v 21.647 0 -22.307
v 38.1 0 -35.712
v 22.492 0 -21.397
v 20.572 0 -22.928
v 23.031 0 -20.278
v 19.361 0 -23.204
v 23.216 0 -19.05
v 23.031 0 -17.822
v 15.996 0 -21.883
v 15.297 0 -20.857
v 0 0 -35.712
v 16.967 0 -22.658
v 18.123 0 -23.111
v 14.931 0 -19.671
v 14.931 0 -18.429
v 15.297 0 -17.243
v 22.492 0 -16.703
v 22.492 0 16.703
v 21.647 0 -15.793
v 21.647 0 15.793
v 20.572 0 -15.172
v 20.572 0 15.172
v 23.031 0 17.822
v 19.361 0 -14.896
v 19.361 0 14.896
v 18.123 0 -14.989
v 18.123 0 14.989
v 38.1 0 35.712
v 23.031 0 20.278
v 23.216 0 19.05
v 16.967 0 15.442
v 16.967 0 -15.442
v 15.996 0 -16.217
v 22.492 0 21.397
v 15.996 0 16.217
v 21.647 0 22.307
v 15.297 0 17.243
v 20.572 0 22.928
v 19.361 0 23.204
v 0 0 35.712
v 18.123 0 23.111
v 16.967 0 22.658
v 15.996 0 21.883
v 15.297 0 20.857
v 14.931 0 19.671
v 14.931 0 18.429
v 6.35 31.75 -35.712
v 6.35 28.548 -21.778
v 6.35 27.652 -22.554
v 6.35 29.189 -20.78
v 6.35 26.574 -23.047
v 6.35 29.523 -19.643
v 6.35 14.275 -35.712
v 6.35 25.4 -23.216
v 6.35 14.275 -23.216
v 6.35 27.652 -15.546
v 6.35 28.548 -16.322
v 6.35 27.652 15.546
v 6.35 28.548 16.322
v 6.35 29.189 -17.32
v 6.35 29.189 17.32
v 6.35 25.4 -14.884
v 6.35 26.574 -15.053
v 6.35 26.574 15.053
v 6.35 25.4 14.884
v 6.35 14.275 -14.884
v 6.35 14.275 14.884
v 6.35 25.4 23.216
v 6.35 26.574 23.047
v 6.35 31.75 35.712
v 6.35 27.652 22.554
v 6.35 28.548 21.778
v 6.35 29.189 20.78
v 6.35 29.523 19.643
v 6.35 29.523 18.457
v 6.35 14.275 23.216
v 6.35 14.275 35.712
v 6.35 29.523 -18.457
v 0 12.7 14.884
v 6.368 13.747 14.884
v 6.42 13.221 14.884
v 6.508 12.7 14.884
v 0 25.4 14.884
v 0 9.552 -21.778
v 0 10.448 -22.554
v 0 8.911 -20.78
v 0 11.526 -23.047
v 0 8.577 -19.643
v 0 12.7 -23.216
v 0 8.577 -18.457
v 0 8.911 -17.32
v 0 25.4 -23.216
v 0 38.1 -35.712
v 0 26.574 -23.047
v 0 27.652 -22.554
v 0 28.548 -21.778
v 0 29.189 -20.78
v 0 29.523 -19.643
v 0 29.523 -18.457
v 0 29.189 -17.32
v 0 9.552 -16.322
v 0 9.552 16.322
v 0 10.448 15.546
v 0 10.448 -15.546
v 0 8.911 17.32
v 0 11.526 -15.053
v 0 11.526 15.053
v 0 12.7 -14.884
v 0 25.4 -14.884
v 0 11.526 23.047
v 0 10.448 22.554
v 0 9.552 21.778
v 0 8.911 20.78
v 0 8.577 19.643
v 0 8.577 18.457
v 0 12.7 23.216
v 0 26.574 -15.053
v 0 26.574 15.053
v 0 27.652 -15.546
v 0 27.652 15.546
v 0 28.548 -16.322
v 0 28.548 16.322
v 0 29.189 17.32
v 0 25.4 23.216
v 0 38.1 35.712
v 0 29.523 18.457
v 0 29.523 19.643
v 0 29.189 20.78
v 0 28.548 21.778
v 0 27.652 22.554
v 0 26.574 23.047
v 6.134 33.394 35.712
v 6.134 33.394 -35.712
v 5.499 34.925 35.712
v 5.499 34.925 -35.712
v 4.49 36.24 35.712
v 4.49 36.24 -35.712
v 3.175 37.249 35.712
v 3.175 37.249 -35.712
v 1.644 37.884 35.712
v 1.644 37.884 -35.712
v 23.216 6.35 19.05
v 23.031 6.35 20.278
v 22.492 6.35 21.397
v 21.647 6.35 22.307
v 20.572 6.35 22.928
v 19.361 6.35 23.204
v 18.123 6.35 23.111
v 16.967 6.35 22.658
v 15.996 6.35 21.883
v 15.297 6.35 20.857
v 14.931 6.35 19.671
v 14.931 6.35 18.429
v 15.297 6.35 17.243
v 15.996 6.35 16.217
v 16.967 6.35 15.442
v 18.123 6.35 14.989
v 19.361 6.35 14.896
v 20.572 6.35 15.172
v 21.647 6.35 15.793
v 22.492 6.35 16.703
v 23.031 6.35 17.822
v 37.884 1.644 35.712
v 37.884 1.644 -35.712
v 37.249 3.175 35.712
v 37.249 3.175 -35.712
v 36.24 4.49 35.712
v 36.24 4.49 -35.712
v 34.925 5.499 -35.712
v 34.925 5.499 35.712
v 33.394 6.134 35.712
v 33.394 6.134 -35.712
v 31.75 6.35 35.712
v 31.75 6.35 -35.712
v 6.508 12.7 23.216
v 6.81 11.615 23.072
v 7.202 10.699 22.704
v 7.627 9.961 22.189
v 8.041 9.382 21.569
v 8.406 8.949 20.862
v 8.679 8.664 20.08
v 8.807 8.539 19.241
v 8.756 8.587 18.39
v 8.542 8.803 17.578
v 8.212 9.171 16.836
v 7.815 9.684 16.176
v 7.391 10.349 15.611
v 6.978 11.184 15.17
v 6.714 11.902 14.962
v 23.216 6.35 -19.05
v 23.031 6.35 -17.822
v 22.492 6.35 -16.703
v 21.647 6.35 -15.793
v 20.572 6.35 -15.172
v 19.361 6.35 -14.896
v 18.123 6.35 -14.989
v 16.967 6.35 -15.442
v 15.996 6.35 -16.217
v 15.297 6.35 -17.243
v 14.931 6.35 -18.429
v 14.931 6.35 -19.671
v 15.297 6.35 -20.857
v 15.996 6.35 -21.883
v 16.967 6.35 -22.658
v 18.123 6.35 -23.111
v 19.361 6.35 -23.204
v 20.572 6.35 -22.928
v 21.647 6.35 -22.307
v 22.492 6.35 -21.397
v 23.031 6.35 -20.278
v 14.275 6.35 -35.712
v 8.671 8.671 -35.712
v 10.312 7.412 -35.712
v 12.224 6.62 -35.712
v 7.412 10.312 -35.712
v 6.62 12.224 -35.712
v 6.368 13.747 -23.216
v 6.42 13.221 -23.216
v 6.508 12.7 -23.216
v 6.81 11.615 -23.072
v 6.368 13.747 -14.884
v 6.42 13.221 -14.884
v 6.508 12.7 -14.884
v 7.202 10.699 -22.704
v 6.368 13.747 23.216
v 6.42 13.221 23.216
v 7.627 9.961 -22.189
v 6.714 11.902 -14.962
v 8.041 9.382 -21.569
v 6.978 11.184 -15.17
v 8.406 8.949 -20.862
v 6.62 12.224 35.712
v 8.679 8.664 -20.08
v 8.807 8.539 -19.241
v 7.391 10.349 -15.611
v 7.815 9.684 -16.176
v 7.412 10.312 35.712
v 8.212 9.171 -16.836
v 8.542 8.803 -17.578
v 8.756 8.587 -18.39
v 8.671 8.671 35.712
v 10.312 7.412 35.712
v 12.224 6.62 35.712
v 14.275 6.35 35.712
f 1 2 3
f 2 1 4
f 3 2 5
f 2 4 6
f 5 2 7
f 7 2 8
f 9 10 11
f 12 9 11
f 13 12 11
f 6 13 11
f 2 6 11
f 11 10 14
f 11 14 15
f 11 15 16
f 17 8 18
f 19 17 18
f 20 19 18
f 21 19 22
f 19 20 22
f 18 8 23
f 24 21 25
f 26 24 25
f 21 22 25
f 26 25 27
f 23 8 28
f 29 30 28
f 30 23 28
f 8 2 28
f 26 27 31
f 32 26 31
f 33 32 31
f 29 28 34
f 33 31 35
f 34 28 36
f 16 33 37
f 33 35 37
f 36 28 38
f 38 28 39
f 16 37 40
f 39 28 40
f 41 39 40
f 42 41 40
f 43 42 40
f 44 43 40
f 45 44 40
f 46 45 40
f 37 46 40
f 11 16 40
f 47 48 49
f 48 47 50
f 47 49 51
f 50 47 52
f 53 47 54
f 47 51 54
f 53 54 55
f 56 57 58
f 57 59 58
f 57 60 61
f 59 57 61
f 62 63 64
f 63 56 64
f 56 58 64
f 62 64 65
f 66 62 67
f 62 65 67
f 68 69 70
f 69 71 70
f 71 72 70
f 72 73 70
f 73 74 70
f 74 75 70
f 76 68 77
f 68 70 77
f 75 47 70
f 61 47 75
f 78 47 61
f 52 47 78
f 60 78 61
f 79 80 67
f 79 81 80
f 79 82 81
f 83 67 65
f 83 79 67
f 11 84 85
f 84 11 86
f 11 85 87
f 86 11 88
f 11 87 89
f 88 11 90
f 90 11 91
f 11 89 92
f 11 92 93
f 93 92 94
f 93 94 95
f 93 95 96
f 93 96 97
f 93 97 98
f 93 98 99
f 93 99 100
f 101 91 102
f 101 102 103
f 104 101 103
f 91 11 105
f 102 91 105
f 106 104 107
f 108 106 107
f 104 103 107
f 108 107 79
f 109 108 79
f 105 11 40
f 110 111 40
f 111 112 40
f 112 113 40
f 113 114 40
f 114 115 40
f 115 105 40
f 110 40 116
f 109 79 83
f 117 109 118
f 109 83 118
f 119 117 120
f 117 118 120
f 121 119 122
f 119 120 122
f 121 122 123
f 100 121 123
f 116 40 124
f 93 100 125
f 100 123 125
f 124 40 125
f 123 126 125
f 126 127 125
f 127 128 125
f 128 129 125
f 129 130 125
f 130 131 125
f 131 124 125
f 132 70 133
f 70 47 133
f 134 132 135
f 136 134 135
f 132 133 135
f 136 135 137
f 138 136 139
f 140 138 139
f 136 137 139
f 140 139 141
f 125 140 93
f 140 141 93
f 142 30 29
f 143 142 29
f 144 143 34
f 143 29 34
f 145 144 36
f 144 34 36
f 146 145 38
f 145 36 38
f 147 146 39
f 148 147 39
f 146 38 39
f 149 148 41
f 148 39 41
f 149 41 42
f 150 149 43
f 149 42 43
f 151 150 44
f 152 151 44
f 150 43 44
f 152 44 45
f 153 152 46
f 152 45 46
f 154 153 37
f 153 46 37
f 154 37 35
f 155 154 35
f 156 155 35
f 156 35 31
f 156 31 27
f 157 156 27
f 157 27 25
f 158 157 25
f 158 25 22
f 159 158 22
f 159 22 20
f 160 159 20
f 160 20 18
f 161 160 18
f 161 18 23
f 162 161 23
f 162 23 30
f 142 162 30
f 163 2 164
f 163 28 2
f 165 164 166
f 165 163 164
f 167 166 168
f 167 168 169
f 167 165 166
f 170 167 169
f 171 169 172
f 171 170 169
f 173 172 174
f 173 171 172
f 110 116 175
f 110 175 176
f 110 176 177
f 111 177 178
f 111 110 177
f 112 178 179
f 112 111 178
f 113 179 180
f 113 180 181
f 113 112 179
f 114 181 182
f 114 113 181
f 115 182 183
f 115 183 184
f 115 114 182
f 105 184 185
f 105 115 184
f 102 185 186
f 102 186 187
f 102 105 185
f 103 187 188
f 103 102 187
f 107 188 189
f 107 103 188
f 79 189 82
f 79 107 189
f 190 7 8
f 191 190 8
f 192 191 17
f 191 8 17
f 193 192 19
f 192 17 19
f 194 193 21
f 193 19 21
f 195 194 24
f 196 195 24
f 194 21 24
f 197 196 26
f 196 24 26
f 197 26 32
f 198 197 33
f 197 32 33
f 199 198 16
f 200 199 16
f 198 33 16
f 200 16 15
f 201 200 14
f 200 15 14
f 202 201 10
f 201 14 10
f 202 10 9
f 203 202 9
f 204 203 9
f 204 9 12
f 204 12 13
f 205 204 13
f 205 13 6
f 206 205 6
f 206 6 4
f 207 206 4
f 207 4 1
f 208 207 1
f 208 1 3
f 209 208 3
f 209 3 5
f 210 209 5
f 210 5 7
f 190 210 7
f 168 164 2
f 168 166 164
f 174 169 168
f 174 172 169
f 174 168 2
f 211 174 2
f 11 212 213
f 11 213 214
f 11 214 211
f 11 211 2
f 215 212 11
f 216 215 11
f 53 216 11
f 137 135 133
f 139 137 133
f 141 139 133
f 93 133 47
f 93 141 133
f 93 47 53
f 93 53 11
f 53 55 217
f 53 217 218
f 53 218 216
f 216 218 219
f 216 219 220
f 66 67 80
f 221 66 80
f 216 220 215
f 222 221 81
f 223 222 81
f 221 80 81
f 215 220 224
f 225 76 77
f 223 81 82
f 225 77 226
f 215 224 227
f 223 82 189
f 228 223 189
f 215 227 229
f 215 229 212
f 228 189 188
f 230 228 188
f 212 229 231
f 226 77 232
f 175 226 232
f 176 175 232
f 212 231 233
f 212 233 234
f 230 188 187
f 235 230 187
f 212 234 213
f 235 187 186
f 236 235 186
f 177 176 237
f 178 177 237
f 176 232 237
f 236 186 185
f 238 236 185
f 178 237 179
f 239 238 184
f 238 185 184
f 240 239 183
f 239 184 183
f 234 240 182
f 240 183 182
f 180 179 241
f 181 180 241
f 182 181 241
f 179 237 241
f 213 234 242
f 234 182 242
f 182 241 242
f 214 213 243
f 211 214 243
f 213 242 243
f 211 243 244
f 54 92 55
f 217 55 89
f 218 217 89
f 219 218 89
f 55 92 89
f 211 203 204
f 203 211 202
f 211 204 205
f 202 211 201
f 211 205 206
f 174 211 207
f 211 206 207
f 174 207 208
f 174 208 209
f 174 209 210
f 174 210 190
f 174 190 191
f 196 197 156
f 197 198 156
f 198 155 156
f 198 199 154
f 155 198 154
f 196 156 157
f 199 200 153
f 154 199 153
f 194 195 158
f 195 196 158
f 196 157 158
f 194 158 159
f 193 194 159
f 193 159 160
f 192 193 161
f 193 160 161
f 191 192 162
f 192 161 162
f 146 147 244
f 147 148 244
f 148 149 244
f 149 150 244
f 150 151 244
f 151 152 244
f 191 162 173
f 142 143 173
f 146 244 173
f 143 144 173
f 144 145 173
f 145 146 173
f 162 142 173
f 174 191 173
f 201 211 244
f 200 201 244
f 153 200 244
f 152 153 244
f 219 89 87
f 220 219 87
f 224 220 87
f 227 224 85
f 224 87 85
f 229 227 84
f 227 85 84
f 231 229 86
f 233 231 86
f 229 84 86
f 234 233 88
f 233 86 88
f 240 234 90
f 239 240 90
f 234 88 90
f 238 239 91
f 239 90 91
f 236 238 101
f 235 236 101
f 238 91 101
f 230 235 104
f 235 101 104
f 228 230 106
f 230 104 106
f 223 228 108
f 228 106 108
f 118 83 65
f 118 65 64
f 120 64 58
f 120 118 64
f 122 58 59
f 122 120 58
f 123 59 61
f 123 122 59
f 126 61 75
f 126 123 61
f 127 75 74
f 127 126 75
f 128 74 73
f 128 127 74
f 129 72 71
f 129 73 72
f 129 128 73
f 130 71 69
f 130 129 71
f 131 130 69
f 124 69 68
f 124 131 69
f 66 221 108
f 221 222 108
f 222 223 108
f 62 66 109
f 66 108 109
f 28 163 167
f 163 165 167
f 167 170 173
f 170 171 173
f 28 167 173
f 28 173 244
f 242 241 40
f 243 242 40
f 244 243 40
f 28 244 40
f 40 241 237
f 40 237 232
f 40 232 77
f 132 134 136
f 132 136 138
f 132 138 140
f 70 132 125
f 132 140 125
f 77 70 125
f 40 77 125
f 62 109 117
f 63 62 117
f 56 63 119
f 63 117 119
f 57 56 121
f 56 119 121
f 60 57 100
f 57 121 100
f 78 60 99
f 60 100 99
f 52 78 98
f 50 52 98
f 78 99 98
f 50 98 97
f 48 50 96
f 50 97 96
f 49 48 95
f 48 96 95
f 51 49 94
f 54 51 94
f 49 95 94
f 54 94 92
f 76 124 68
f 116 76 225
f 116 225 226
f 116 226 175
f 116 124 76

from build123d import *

# Parameters (mm, degrees)
BOSS_EXTRUDE1_DEPTH = 35.7124
FILLET1_R           = 6.35
CUT_EXTRUDE1_DEPTH  = 65.64205685
CUT_EXTRUDE2_REACH  = 66.642
SKETCH4_R           = 4.1656


with BuildPart() as part:
    # Sketch2 → Boss-Extrude1 (new, symmetric)
    with BuildSketch(Plane.XY):
        with BuildLine():
            Line((0, 0), (0, 38.1))
            Line((0, 38.1), (6.35, 38.1))
            Line((6.35, 38.1), (6.35, 14.2748))
            ThreePointArc((6.35, 14.2748), (8.67112018, 8.67112018), (14.2748, 6.35))
            Line((14.2748, 6.35), (38.1, 6.35))
            Line((38.1, 6.35), (38.1, 0))
            Line((38.1, 0), (0, 0))
        make_face()
    extrude(amount=BOSS_EXTRUDE1_DEPTH, both=True)

    # Fillet1
    fillet1_edges = [part.edges().sort_by_distance(p)[0] for p in [
        (38.1, 6.35, 0),
        (6.35, 38.1, 0),
    ]]
    fillet(fillet1_edges, radius=FILLET1_R - 0.0001)  # a hair under: the kernel refuses the full size

    # Sketch3 → Cut-Extrude1 (cut, through all)
    with BuildSketch(Plane.ZY):
        with BuildLine():
            Line((-23.2156, 25.4), (-23.2156, 12.7))
            ThreePointArc((-23.2156, 12.7), (-19.05, 8.5344), (-14.8844, 12.7))
            Line((-14.8844, 12.7), (-14.8844, 25.4))
            ThreePointArc((-14.8844, 25.4), (-19.05, 29.5656), (-23.2156, 25.4))
        make_face()
        with BuildLine():
            Line((14.8844, 12.7), (14.8844, 25.4))
            ThreePointArc((14.8844, 25.4), (19.05, 29.5656), (23.2156, 25.4))
            Line((23.2156, 25.4), (23.2156, 12.7))
            ThreePointArc((23.2156, 12.7), (19.05, 8.5344), (14.8844, 12.7))
        make_face()
    extrude(amount=-CUT_EXTRUDE1_DEPTH, mode=Mode.SUBTRACT)

    # Sketch4 → Cut-Extrude2 (cut, up to next)
    with BuildSketch(Plane.XZ, mode=Mode.PRIVATE) as cut_extrude2_sk1:
        with Locations((19.05, -19.05)):
            Circle(SKETCH4_R)
    cut_extrude2_tool1 = extrude(cut_extrude2_sk1.sketch, amount=-CUT_EXTRUDE2_REACH, mode=Mode.PRIVATE) & part.part
    # Sketch4 → Cut-Extrude2 (cut, up to next)
    with BuildSketch(Plane.XZ, mode=Mode.PRIVATE) as cut_extrude2_sk2:
        with Locations((19.05, 19.05)):
            Circle(SKETCH4_R)
    cut_extrude2_tool2 = extrude(cut_extrude2_sk2.sketch, amount=-CUT_EXTRUDE2_REACH, mode=Mode.PRIVATE) & part.part
    add(cut_extrude2_tool1.solids().sort_by_distance((19.05, 0, -19.05))[0], mode=Mode.SUBTRACT)
    add(cut_extrude2_tool2.solids().sort_by_distance((19.05, 0, 19.05))[0], mode=Mode.SUBTRACT)


solid = part.part
